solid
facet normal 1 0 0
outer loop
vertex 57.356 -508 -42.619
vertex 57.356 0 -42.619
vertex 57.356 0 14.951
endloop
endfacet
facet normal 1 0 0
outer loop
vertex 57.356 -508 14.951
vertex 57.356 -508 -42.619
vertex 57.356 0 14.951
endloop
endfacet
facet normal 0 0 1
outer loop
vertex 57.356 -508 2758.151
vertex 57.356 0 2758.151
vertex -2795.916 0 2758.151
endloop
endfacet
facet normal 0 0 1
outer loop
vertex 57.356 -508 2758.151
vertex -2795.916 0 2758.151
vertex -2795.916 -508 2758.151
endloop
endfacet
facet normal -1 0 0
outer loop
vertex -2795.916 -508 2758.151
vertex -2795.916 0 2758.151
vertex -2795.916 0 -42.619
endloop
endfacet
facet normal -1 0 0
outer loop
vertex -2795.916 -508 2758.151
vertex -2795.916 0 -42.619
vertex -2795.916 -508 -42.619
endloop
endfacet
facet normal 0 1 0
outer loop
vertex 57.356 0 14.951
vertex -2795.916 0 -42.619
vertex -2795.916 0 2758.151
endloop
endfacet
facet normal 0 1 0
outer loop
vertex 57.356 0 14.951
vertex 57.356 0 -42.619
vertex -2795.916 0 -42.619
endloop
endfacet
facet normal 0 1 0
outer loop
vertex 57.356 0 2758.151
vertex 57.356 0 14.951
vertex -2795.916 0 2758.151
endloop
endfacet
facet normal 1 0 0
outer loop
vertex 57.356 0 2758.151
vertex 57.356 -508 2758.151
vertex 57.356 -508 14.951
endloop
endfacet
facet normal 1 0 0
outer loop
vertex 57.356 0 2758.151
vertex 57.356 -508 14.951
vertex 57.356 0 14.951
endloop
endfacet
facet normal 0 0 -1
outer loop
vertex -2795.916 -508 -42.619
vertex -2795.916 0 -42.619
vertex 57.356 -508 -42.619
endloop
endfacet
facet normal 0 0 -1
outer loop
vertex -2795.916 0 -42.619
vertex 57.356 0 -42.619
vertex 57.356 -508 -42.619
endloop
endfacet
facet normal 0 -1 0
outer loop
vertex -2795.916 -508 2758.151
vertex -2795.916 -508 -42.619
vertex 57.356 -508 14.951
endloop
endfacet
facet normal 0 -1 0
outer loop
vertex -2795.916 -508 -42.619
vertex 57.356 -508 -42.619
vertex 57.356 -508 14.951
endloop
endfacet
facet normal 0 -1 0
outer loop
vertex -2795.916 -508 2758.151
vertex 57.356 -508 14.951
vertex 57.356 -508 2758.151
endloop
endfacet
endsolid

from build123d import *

# Parameters (mm, degrees)
F1_DEPTH      = 508
F1_FACE_W     = 110.071152
F1_FACE_H     = 508
F2_DEPTH      = 2743.2
F2_DEPTH_BACK = 25.4
F2_FACE_W     = 508
F2_FACE_H     = 2800.770394
F3_DEPTH      = 2743.2


with BuildPart() as f1:
    # F0 (on Front) → F1 (new body)
    with BuildSketch(Plane.XZ):
        Polygon((-52.71557, 14.951106), (-52.71557, -42.619288), (-47.366679, -42.619288), (57.355583, -42.619288), (57.355583, 14.951106), align=None)
    extrude(amount=F1_DEPTH)

    # F1_face (on face) → F2 (join, two sides)
    with BuildSketch(Plane(origin=(2.320006, -254, 14.951106), x_dir=(1, 0, 0), z_dir=(0, 0, 1))) as f2_sk:
        Rectangle(F1_FACE_W, F1_FACE_H)
    extrude(amount=F2_DEPTH)
    extrude(f2_sk.sketch, amount=-F2_DEPTH_BACK)

    # F2_face (on face) → F3 (join)
    with BuildSketch(Plane(origin=(-52.71557, -254, 1357.765909), x_dir=(0, -1, 0), z_dir=(-1, 0, 0))):
        Rectangle(F2_FACE_W, F2_FACE_H)
    extrude(amount=F3_DEPTH)


solid = f1.part
